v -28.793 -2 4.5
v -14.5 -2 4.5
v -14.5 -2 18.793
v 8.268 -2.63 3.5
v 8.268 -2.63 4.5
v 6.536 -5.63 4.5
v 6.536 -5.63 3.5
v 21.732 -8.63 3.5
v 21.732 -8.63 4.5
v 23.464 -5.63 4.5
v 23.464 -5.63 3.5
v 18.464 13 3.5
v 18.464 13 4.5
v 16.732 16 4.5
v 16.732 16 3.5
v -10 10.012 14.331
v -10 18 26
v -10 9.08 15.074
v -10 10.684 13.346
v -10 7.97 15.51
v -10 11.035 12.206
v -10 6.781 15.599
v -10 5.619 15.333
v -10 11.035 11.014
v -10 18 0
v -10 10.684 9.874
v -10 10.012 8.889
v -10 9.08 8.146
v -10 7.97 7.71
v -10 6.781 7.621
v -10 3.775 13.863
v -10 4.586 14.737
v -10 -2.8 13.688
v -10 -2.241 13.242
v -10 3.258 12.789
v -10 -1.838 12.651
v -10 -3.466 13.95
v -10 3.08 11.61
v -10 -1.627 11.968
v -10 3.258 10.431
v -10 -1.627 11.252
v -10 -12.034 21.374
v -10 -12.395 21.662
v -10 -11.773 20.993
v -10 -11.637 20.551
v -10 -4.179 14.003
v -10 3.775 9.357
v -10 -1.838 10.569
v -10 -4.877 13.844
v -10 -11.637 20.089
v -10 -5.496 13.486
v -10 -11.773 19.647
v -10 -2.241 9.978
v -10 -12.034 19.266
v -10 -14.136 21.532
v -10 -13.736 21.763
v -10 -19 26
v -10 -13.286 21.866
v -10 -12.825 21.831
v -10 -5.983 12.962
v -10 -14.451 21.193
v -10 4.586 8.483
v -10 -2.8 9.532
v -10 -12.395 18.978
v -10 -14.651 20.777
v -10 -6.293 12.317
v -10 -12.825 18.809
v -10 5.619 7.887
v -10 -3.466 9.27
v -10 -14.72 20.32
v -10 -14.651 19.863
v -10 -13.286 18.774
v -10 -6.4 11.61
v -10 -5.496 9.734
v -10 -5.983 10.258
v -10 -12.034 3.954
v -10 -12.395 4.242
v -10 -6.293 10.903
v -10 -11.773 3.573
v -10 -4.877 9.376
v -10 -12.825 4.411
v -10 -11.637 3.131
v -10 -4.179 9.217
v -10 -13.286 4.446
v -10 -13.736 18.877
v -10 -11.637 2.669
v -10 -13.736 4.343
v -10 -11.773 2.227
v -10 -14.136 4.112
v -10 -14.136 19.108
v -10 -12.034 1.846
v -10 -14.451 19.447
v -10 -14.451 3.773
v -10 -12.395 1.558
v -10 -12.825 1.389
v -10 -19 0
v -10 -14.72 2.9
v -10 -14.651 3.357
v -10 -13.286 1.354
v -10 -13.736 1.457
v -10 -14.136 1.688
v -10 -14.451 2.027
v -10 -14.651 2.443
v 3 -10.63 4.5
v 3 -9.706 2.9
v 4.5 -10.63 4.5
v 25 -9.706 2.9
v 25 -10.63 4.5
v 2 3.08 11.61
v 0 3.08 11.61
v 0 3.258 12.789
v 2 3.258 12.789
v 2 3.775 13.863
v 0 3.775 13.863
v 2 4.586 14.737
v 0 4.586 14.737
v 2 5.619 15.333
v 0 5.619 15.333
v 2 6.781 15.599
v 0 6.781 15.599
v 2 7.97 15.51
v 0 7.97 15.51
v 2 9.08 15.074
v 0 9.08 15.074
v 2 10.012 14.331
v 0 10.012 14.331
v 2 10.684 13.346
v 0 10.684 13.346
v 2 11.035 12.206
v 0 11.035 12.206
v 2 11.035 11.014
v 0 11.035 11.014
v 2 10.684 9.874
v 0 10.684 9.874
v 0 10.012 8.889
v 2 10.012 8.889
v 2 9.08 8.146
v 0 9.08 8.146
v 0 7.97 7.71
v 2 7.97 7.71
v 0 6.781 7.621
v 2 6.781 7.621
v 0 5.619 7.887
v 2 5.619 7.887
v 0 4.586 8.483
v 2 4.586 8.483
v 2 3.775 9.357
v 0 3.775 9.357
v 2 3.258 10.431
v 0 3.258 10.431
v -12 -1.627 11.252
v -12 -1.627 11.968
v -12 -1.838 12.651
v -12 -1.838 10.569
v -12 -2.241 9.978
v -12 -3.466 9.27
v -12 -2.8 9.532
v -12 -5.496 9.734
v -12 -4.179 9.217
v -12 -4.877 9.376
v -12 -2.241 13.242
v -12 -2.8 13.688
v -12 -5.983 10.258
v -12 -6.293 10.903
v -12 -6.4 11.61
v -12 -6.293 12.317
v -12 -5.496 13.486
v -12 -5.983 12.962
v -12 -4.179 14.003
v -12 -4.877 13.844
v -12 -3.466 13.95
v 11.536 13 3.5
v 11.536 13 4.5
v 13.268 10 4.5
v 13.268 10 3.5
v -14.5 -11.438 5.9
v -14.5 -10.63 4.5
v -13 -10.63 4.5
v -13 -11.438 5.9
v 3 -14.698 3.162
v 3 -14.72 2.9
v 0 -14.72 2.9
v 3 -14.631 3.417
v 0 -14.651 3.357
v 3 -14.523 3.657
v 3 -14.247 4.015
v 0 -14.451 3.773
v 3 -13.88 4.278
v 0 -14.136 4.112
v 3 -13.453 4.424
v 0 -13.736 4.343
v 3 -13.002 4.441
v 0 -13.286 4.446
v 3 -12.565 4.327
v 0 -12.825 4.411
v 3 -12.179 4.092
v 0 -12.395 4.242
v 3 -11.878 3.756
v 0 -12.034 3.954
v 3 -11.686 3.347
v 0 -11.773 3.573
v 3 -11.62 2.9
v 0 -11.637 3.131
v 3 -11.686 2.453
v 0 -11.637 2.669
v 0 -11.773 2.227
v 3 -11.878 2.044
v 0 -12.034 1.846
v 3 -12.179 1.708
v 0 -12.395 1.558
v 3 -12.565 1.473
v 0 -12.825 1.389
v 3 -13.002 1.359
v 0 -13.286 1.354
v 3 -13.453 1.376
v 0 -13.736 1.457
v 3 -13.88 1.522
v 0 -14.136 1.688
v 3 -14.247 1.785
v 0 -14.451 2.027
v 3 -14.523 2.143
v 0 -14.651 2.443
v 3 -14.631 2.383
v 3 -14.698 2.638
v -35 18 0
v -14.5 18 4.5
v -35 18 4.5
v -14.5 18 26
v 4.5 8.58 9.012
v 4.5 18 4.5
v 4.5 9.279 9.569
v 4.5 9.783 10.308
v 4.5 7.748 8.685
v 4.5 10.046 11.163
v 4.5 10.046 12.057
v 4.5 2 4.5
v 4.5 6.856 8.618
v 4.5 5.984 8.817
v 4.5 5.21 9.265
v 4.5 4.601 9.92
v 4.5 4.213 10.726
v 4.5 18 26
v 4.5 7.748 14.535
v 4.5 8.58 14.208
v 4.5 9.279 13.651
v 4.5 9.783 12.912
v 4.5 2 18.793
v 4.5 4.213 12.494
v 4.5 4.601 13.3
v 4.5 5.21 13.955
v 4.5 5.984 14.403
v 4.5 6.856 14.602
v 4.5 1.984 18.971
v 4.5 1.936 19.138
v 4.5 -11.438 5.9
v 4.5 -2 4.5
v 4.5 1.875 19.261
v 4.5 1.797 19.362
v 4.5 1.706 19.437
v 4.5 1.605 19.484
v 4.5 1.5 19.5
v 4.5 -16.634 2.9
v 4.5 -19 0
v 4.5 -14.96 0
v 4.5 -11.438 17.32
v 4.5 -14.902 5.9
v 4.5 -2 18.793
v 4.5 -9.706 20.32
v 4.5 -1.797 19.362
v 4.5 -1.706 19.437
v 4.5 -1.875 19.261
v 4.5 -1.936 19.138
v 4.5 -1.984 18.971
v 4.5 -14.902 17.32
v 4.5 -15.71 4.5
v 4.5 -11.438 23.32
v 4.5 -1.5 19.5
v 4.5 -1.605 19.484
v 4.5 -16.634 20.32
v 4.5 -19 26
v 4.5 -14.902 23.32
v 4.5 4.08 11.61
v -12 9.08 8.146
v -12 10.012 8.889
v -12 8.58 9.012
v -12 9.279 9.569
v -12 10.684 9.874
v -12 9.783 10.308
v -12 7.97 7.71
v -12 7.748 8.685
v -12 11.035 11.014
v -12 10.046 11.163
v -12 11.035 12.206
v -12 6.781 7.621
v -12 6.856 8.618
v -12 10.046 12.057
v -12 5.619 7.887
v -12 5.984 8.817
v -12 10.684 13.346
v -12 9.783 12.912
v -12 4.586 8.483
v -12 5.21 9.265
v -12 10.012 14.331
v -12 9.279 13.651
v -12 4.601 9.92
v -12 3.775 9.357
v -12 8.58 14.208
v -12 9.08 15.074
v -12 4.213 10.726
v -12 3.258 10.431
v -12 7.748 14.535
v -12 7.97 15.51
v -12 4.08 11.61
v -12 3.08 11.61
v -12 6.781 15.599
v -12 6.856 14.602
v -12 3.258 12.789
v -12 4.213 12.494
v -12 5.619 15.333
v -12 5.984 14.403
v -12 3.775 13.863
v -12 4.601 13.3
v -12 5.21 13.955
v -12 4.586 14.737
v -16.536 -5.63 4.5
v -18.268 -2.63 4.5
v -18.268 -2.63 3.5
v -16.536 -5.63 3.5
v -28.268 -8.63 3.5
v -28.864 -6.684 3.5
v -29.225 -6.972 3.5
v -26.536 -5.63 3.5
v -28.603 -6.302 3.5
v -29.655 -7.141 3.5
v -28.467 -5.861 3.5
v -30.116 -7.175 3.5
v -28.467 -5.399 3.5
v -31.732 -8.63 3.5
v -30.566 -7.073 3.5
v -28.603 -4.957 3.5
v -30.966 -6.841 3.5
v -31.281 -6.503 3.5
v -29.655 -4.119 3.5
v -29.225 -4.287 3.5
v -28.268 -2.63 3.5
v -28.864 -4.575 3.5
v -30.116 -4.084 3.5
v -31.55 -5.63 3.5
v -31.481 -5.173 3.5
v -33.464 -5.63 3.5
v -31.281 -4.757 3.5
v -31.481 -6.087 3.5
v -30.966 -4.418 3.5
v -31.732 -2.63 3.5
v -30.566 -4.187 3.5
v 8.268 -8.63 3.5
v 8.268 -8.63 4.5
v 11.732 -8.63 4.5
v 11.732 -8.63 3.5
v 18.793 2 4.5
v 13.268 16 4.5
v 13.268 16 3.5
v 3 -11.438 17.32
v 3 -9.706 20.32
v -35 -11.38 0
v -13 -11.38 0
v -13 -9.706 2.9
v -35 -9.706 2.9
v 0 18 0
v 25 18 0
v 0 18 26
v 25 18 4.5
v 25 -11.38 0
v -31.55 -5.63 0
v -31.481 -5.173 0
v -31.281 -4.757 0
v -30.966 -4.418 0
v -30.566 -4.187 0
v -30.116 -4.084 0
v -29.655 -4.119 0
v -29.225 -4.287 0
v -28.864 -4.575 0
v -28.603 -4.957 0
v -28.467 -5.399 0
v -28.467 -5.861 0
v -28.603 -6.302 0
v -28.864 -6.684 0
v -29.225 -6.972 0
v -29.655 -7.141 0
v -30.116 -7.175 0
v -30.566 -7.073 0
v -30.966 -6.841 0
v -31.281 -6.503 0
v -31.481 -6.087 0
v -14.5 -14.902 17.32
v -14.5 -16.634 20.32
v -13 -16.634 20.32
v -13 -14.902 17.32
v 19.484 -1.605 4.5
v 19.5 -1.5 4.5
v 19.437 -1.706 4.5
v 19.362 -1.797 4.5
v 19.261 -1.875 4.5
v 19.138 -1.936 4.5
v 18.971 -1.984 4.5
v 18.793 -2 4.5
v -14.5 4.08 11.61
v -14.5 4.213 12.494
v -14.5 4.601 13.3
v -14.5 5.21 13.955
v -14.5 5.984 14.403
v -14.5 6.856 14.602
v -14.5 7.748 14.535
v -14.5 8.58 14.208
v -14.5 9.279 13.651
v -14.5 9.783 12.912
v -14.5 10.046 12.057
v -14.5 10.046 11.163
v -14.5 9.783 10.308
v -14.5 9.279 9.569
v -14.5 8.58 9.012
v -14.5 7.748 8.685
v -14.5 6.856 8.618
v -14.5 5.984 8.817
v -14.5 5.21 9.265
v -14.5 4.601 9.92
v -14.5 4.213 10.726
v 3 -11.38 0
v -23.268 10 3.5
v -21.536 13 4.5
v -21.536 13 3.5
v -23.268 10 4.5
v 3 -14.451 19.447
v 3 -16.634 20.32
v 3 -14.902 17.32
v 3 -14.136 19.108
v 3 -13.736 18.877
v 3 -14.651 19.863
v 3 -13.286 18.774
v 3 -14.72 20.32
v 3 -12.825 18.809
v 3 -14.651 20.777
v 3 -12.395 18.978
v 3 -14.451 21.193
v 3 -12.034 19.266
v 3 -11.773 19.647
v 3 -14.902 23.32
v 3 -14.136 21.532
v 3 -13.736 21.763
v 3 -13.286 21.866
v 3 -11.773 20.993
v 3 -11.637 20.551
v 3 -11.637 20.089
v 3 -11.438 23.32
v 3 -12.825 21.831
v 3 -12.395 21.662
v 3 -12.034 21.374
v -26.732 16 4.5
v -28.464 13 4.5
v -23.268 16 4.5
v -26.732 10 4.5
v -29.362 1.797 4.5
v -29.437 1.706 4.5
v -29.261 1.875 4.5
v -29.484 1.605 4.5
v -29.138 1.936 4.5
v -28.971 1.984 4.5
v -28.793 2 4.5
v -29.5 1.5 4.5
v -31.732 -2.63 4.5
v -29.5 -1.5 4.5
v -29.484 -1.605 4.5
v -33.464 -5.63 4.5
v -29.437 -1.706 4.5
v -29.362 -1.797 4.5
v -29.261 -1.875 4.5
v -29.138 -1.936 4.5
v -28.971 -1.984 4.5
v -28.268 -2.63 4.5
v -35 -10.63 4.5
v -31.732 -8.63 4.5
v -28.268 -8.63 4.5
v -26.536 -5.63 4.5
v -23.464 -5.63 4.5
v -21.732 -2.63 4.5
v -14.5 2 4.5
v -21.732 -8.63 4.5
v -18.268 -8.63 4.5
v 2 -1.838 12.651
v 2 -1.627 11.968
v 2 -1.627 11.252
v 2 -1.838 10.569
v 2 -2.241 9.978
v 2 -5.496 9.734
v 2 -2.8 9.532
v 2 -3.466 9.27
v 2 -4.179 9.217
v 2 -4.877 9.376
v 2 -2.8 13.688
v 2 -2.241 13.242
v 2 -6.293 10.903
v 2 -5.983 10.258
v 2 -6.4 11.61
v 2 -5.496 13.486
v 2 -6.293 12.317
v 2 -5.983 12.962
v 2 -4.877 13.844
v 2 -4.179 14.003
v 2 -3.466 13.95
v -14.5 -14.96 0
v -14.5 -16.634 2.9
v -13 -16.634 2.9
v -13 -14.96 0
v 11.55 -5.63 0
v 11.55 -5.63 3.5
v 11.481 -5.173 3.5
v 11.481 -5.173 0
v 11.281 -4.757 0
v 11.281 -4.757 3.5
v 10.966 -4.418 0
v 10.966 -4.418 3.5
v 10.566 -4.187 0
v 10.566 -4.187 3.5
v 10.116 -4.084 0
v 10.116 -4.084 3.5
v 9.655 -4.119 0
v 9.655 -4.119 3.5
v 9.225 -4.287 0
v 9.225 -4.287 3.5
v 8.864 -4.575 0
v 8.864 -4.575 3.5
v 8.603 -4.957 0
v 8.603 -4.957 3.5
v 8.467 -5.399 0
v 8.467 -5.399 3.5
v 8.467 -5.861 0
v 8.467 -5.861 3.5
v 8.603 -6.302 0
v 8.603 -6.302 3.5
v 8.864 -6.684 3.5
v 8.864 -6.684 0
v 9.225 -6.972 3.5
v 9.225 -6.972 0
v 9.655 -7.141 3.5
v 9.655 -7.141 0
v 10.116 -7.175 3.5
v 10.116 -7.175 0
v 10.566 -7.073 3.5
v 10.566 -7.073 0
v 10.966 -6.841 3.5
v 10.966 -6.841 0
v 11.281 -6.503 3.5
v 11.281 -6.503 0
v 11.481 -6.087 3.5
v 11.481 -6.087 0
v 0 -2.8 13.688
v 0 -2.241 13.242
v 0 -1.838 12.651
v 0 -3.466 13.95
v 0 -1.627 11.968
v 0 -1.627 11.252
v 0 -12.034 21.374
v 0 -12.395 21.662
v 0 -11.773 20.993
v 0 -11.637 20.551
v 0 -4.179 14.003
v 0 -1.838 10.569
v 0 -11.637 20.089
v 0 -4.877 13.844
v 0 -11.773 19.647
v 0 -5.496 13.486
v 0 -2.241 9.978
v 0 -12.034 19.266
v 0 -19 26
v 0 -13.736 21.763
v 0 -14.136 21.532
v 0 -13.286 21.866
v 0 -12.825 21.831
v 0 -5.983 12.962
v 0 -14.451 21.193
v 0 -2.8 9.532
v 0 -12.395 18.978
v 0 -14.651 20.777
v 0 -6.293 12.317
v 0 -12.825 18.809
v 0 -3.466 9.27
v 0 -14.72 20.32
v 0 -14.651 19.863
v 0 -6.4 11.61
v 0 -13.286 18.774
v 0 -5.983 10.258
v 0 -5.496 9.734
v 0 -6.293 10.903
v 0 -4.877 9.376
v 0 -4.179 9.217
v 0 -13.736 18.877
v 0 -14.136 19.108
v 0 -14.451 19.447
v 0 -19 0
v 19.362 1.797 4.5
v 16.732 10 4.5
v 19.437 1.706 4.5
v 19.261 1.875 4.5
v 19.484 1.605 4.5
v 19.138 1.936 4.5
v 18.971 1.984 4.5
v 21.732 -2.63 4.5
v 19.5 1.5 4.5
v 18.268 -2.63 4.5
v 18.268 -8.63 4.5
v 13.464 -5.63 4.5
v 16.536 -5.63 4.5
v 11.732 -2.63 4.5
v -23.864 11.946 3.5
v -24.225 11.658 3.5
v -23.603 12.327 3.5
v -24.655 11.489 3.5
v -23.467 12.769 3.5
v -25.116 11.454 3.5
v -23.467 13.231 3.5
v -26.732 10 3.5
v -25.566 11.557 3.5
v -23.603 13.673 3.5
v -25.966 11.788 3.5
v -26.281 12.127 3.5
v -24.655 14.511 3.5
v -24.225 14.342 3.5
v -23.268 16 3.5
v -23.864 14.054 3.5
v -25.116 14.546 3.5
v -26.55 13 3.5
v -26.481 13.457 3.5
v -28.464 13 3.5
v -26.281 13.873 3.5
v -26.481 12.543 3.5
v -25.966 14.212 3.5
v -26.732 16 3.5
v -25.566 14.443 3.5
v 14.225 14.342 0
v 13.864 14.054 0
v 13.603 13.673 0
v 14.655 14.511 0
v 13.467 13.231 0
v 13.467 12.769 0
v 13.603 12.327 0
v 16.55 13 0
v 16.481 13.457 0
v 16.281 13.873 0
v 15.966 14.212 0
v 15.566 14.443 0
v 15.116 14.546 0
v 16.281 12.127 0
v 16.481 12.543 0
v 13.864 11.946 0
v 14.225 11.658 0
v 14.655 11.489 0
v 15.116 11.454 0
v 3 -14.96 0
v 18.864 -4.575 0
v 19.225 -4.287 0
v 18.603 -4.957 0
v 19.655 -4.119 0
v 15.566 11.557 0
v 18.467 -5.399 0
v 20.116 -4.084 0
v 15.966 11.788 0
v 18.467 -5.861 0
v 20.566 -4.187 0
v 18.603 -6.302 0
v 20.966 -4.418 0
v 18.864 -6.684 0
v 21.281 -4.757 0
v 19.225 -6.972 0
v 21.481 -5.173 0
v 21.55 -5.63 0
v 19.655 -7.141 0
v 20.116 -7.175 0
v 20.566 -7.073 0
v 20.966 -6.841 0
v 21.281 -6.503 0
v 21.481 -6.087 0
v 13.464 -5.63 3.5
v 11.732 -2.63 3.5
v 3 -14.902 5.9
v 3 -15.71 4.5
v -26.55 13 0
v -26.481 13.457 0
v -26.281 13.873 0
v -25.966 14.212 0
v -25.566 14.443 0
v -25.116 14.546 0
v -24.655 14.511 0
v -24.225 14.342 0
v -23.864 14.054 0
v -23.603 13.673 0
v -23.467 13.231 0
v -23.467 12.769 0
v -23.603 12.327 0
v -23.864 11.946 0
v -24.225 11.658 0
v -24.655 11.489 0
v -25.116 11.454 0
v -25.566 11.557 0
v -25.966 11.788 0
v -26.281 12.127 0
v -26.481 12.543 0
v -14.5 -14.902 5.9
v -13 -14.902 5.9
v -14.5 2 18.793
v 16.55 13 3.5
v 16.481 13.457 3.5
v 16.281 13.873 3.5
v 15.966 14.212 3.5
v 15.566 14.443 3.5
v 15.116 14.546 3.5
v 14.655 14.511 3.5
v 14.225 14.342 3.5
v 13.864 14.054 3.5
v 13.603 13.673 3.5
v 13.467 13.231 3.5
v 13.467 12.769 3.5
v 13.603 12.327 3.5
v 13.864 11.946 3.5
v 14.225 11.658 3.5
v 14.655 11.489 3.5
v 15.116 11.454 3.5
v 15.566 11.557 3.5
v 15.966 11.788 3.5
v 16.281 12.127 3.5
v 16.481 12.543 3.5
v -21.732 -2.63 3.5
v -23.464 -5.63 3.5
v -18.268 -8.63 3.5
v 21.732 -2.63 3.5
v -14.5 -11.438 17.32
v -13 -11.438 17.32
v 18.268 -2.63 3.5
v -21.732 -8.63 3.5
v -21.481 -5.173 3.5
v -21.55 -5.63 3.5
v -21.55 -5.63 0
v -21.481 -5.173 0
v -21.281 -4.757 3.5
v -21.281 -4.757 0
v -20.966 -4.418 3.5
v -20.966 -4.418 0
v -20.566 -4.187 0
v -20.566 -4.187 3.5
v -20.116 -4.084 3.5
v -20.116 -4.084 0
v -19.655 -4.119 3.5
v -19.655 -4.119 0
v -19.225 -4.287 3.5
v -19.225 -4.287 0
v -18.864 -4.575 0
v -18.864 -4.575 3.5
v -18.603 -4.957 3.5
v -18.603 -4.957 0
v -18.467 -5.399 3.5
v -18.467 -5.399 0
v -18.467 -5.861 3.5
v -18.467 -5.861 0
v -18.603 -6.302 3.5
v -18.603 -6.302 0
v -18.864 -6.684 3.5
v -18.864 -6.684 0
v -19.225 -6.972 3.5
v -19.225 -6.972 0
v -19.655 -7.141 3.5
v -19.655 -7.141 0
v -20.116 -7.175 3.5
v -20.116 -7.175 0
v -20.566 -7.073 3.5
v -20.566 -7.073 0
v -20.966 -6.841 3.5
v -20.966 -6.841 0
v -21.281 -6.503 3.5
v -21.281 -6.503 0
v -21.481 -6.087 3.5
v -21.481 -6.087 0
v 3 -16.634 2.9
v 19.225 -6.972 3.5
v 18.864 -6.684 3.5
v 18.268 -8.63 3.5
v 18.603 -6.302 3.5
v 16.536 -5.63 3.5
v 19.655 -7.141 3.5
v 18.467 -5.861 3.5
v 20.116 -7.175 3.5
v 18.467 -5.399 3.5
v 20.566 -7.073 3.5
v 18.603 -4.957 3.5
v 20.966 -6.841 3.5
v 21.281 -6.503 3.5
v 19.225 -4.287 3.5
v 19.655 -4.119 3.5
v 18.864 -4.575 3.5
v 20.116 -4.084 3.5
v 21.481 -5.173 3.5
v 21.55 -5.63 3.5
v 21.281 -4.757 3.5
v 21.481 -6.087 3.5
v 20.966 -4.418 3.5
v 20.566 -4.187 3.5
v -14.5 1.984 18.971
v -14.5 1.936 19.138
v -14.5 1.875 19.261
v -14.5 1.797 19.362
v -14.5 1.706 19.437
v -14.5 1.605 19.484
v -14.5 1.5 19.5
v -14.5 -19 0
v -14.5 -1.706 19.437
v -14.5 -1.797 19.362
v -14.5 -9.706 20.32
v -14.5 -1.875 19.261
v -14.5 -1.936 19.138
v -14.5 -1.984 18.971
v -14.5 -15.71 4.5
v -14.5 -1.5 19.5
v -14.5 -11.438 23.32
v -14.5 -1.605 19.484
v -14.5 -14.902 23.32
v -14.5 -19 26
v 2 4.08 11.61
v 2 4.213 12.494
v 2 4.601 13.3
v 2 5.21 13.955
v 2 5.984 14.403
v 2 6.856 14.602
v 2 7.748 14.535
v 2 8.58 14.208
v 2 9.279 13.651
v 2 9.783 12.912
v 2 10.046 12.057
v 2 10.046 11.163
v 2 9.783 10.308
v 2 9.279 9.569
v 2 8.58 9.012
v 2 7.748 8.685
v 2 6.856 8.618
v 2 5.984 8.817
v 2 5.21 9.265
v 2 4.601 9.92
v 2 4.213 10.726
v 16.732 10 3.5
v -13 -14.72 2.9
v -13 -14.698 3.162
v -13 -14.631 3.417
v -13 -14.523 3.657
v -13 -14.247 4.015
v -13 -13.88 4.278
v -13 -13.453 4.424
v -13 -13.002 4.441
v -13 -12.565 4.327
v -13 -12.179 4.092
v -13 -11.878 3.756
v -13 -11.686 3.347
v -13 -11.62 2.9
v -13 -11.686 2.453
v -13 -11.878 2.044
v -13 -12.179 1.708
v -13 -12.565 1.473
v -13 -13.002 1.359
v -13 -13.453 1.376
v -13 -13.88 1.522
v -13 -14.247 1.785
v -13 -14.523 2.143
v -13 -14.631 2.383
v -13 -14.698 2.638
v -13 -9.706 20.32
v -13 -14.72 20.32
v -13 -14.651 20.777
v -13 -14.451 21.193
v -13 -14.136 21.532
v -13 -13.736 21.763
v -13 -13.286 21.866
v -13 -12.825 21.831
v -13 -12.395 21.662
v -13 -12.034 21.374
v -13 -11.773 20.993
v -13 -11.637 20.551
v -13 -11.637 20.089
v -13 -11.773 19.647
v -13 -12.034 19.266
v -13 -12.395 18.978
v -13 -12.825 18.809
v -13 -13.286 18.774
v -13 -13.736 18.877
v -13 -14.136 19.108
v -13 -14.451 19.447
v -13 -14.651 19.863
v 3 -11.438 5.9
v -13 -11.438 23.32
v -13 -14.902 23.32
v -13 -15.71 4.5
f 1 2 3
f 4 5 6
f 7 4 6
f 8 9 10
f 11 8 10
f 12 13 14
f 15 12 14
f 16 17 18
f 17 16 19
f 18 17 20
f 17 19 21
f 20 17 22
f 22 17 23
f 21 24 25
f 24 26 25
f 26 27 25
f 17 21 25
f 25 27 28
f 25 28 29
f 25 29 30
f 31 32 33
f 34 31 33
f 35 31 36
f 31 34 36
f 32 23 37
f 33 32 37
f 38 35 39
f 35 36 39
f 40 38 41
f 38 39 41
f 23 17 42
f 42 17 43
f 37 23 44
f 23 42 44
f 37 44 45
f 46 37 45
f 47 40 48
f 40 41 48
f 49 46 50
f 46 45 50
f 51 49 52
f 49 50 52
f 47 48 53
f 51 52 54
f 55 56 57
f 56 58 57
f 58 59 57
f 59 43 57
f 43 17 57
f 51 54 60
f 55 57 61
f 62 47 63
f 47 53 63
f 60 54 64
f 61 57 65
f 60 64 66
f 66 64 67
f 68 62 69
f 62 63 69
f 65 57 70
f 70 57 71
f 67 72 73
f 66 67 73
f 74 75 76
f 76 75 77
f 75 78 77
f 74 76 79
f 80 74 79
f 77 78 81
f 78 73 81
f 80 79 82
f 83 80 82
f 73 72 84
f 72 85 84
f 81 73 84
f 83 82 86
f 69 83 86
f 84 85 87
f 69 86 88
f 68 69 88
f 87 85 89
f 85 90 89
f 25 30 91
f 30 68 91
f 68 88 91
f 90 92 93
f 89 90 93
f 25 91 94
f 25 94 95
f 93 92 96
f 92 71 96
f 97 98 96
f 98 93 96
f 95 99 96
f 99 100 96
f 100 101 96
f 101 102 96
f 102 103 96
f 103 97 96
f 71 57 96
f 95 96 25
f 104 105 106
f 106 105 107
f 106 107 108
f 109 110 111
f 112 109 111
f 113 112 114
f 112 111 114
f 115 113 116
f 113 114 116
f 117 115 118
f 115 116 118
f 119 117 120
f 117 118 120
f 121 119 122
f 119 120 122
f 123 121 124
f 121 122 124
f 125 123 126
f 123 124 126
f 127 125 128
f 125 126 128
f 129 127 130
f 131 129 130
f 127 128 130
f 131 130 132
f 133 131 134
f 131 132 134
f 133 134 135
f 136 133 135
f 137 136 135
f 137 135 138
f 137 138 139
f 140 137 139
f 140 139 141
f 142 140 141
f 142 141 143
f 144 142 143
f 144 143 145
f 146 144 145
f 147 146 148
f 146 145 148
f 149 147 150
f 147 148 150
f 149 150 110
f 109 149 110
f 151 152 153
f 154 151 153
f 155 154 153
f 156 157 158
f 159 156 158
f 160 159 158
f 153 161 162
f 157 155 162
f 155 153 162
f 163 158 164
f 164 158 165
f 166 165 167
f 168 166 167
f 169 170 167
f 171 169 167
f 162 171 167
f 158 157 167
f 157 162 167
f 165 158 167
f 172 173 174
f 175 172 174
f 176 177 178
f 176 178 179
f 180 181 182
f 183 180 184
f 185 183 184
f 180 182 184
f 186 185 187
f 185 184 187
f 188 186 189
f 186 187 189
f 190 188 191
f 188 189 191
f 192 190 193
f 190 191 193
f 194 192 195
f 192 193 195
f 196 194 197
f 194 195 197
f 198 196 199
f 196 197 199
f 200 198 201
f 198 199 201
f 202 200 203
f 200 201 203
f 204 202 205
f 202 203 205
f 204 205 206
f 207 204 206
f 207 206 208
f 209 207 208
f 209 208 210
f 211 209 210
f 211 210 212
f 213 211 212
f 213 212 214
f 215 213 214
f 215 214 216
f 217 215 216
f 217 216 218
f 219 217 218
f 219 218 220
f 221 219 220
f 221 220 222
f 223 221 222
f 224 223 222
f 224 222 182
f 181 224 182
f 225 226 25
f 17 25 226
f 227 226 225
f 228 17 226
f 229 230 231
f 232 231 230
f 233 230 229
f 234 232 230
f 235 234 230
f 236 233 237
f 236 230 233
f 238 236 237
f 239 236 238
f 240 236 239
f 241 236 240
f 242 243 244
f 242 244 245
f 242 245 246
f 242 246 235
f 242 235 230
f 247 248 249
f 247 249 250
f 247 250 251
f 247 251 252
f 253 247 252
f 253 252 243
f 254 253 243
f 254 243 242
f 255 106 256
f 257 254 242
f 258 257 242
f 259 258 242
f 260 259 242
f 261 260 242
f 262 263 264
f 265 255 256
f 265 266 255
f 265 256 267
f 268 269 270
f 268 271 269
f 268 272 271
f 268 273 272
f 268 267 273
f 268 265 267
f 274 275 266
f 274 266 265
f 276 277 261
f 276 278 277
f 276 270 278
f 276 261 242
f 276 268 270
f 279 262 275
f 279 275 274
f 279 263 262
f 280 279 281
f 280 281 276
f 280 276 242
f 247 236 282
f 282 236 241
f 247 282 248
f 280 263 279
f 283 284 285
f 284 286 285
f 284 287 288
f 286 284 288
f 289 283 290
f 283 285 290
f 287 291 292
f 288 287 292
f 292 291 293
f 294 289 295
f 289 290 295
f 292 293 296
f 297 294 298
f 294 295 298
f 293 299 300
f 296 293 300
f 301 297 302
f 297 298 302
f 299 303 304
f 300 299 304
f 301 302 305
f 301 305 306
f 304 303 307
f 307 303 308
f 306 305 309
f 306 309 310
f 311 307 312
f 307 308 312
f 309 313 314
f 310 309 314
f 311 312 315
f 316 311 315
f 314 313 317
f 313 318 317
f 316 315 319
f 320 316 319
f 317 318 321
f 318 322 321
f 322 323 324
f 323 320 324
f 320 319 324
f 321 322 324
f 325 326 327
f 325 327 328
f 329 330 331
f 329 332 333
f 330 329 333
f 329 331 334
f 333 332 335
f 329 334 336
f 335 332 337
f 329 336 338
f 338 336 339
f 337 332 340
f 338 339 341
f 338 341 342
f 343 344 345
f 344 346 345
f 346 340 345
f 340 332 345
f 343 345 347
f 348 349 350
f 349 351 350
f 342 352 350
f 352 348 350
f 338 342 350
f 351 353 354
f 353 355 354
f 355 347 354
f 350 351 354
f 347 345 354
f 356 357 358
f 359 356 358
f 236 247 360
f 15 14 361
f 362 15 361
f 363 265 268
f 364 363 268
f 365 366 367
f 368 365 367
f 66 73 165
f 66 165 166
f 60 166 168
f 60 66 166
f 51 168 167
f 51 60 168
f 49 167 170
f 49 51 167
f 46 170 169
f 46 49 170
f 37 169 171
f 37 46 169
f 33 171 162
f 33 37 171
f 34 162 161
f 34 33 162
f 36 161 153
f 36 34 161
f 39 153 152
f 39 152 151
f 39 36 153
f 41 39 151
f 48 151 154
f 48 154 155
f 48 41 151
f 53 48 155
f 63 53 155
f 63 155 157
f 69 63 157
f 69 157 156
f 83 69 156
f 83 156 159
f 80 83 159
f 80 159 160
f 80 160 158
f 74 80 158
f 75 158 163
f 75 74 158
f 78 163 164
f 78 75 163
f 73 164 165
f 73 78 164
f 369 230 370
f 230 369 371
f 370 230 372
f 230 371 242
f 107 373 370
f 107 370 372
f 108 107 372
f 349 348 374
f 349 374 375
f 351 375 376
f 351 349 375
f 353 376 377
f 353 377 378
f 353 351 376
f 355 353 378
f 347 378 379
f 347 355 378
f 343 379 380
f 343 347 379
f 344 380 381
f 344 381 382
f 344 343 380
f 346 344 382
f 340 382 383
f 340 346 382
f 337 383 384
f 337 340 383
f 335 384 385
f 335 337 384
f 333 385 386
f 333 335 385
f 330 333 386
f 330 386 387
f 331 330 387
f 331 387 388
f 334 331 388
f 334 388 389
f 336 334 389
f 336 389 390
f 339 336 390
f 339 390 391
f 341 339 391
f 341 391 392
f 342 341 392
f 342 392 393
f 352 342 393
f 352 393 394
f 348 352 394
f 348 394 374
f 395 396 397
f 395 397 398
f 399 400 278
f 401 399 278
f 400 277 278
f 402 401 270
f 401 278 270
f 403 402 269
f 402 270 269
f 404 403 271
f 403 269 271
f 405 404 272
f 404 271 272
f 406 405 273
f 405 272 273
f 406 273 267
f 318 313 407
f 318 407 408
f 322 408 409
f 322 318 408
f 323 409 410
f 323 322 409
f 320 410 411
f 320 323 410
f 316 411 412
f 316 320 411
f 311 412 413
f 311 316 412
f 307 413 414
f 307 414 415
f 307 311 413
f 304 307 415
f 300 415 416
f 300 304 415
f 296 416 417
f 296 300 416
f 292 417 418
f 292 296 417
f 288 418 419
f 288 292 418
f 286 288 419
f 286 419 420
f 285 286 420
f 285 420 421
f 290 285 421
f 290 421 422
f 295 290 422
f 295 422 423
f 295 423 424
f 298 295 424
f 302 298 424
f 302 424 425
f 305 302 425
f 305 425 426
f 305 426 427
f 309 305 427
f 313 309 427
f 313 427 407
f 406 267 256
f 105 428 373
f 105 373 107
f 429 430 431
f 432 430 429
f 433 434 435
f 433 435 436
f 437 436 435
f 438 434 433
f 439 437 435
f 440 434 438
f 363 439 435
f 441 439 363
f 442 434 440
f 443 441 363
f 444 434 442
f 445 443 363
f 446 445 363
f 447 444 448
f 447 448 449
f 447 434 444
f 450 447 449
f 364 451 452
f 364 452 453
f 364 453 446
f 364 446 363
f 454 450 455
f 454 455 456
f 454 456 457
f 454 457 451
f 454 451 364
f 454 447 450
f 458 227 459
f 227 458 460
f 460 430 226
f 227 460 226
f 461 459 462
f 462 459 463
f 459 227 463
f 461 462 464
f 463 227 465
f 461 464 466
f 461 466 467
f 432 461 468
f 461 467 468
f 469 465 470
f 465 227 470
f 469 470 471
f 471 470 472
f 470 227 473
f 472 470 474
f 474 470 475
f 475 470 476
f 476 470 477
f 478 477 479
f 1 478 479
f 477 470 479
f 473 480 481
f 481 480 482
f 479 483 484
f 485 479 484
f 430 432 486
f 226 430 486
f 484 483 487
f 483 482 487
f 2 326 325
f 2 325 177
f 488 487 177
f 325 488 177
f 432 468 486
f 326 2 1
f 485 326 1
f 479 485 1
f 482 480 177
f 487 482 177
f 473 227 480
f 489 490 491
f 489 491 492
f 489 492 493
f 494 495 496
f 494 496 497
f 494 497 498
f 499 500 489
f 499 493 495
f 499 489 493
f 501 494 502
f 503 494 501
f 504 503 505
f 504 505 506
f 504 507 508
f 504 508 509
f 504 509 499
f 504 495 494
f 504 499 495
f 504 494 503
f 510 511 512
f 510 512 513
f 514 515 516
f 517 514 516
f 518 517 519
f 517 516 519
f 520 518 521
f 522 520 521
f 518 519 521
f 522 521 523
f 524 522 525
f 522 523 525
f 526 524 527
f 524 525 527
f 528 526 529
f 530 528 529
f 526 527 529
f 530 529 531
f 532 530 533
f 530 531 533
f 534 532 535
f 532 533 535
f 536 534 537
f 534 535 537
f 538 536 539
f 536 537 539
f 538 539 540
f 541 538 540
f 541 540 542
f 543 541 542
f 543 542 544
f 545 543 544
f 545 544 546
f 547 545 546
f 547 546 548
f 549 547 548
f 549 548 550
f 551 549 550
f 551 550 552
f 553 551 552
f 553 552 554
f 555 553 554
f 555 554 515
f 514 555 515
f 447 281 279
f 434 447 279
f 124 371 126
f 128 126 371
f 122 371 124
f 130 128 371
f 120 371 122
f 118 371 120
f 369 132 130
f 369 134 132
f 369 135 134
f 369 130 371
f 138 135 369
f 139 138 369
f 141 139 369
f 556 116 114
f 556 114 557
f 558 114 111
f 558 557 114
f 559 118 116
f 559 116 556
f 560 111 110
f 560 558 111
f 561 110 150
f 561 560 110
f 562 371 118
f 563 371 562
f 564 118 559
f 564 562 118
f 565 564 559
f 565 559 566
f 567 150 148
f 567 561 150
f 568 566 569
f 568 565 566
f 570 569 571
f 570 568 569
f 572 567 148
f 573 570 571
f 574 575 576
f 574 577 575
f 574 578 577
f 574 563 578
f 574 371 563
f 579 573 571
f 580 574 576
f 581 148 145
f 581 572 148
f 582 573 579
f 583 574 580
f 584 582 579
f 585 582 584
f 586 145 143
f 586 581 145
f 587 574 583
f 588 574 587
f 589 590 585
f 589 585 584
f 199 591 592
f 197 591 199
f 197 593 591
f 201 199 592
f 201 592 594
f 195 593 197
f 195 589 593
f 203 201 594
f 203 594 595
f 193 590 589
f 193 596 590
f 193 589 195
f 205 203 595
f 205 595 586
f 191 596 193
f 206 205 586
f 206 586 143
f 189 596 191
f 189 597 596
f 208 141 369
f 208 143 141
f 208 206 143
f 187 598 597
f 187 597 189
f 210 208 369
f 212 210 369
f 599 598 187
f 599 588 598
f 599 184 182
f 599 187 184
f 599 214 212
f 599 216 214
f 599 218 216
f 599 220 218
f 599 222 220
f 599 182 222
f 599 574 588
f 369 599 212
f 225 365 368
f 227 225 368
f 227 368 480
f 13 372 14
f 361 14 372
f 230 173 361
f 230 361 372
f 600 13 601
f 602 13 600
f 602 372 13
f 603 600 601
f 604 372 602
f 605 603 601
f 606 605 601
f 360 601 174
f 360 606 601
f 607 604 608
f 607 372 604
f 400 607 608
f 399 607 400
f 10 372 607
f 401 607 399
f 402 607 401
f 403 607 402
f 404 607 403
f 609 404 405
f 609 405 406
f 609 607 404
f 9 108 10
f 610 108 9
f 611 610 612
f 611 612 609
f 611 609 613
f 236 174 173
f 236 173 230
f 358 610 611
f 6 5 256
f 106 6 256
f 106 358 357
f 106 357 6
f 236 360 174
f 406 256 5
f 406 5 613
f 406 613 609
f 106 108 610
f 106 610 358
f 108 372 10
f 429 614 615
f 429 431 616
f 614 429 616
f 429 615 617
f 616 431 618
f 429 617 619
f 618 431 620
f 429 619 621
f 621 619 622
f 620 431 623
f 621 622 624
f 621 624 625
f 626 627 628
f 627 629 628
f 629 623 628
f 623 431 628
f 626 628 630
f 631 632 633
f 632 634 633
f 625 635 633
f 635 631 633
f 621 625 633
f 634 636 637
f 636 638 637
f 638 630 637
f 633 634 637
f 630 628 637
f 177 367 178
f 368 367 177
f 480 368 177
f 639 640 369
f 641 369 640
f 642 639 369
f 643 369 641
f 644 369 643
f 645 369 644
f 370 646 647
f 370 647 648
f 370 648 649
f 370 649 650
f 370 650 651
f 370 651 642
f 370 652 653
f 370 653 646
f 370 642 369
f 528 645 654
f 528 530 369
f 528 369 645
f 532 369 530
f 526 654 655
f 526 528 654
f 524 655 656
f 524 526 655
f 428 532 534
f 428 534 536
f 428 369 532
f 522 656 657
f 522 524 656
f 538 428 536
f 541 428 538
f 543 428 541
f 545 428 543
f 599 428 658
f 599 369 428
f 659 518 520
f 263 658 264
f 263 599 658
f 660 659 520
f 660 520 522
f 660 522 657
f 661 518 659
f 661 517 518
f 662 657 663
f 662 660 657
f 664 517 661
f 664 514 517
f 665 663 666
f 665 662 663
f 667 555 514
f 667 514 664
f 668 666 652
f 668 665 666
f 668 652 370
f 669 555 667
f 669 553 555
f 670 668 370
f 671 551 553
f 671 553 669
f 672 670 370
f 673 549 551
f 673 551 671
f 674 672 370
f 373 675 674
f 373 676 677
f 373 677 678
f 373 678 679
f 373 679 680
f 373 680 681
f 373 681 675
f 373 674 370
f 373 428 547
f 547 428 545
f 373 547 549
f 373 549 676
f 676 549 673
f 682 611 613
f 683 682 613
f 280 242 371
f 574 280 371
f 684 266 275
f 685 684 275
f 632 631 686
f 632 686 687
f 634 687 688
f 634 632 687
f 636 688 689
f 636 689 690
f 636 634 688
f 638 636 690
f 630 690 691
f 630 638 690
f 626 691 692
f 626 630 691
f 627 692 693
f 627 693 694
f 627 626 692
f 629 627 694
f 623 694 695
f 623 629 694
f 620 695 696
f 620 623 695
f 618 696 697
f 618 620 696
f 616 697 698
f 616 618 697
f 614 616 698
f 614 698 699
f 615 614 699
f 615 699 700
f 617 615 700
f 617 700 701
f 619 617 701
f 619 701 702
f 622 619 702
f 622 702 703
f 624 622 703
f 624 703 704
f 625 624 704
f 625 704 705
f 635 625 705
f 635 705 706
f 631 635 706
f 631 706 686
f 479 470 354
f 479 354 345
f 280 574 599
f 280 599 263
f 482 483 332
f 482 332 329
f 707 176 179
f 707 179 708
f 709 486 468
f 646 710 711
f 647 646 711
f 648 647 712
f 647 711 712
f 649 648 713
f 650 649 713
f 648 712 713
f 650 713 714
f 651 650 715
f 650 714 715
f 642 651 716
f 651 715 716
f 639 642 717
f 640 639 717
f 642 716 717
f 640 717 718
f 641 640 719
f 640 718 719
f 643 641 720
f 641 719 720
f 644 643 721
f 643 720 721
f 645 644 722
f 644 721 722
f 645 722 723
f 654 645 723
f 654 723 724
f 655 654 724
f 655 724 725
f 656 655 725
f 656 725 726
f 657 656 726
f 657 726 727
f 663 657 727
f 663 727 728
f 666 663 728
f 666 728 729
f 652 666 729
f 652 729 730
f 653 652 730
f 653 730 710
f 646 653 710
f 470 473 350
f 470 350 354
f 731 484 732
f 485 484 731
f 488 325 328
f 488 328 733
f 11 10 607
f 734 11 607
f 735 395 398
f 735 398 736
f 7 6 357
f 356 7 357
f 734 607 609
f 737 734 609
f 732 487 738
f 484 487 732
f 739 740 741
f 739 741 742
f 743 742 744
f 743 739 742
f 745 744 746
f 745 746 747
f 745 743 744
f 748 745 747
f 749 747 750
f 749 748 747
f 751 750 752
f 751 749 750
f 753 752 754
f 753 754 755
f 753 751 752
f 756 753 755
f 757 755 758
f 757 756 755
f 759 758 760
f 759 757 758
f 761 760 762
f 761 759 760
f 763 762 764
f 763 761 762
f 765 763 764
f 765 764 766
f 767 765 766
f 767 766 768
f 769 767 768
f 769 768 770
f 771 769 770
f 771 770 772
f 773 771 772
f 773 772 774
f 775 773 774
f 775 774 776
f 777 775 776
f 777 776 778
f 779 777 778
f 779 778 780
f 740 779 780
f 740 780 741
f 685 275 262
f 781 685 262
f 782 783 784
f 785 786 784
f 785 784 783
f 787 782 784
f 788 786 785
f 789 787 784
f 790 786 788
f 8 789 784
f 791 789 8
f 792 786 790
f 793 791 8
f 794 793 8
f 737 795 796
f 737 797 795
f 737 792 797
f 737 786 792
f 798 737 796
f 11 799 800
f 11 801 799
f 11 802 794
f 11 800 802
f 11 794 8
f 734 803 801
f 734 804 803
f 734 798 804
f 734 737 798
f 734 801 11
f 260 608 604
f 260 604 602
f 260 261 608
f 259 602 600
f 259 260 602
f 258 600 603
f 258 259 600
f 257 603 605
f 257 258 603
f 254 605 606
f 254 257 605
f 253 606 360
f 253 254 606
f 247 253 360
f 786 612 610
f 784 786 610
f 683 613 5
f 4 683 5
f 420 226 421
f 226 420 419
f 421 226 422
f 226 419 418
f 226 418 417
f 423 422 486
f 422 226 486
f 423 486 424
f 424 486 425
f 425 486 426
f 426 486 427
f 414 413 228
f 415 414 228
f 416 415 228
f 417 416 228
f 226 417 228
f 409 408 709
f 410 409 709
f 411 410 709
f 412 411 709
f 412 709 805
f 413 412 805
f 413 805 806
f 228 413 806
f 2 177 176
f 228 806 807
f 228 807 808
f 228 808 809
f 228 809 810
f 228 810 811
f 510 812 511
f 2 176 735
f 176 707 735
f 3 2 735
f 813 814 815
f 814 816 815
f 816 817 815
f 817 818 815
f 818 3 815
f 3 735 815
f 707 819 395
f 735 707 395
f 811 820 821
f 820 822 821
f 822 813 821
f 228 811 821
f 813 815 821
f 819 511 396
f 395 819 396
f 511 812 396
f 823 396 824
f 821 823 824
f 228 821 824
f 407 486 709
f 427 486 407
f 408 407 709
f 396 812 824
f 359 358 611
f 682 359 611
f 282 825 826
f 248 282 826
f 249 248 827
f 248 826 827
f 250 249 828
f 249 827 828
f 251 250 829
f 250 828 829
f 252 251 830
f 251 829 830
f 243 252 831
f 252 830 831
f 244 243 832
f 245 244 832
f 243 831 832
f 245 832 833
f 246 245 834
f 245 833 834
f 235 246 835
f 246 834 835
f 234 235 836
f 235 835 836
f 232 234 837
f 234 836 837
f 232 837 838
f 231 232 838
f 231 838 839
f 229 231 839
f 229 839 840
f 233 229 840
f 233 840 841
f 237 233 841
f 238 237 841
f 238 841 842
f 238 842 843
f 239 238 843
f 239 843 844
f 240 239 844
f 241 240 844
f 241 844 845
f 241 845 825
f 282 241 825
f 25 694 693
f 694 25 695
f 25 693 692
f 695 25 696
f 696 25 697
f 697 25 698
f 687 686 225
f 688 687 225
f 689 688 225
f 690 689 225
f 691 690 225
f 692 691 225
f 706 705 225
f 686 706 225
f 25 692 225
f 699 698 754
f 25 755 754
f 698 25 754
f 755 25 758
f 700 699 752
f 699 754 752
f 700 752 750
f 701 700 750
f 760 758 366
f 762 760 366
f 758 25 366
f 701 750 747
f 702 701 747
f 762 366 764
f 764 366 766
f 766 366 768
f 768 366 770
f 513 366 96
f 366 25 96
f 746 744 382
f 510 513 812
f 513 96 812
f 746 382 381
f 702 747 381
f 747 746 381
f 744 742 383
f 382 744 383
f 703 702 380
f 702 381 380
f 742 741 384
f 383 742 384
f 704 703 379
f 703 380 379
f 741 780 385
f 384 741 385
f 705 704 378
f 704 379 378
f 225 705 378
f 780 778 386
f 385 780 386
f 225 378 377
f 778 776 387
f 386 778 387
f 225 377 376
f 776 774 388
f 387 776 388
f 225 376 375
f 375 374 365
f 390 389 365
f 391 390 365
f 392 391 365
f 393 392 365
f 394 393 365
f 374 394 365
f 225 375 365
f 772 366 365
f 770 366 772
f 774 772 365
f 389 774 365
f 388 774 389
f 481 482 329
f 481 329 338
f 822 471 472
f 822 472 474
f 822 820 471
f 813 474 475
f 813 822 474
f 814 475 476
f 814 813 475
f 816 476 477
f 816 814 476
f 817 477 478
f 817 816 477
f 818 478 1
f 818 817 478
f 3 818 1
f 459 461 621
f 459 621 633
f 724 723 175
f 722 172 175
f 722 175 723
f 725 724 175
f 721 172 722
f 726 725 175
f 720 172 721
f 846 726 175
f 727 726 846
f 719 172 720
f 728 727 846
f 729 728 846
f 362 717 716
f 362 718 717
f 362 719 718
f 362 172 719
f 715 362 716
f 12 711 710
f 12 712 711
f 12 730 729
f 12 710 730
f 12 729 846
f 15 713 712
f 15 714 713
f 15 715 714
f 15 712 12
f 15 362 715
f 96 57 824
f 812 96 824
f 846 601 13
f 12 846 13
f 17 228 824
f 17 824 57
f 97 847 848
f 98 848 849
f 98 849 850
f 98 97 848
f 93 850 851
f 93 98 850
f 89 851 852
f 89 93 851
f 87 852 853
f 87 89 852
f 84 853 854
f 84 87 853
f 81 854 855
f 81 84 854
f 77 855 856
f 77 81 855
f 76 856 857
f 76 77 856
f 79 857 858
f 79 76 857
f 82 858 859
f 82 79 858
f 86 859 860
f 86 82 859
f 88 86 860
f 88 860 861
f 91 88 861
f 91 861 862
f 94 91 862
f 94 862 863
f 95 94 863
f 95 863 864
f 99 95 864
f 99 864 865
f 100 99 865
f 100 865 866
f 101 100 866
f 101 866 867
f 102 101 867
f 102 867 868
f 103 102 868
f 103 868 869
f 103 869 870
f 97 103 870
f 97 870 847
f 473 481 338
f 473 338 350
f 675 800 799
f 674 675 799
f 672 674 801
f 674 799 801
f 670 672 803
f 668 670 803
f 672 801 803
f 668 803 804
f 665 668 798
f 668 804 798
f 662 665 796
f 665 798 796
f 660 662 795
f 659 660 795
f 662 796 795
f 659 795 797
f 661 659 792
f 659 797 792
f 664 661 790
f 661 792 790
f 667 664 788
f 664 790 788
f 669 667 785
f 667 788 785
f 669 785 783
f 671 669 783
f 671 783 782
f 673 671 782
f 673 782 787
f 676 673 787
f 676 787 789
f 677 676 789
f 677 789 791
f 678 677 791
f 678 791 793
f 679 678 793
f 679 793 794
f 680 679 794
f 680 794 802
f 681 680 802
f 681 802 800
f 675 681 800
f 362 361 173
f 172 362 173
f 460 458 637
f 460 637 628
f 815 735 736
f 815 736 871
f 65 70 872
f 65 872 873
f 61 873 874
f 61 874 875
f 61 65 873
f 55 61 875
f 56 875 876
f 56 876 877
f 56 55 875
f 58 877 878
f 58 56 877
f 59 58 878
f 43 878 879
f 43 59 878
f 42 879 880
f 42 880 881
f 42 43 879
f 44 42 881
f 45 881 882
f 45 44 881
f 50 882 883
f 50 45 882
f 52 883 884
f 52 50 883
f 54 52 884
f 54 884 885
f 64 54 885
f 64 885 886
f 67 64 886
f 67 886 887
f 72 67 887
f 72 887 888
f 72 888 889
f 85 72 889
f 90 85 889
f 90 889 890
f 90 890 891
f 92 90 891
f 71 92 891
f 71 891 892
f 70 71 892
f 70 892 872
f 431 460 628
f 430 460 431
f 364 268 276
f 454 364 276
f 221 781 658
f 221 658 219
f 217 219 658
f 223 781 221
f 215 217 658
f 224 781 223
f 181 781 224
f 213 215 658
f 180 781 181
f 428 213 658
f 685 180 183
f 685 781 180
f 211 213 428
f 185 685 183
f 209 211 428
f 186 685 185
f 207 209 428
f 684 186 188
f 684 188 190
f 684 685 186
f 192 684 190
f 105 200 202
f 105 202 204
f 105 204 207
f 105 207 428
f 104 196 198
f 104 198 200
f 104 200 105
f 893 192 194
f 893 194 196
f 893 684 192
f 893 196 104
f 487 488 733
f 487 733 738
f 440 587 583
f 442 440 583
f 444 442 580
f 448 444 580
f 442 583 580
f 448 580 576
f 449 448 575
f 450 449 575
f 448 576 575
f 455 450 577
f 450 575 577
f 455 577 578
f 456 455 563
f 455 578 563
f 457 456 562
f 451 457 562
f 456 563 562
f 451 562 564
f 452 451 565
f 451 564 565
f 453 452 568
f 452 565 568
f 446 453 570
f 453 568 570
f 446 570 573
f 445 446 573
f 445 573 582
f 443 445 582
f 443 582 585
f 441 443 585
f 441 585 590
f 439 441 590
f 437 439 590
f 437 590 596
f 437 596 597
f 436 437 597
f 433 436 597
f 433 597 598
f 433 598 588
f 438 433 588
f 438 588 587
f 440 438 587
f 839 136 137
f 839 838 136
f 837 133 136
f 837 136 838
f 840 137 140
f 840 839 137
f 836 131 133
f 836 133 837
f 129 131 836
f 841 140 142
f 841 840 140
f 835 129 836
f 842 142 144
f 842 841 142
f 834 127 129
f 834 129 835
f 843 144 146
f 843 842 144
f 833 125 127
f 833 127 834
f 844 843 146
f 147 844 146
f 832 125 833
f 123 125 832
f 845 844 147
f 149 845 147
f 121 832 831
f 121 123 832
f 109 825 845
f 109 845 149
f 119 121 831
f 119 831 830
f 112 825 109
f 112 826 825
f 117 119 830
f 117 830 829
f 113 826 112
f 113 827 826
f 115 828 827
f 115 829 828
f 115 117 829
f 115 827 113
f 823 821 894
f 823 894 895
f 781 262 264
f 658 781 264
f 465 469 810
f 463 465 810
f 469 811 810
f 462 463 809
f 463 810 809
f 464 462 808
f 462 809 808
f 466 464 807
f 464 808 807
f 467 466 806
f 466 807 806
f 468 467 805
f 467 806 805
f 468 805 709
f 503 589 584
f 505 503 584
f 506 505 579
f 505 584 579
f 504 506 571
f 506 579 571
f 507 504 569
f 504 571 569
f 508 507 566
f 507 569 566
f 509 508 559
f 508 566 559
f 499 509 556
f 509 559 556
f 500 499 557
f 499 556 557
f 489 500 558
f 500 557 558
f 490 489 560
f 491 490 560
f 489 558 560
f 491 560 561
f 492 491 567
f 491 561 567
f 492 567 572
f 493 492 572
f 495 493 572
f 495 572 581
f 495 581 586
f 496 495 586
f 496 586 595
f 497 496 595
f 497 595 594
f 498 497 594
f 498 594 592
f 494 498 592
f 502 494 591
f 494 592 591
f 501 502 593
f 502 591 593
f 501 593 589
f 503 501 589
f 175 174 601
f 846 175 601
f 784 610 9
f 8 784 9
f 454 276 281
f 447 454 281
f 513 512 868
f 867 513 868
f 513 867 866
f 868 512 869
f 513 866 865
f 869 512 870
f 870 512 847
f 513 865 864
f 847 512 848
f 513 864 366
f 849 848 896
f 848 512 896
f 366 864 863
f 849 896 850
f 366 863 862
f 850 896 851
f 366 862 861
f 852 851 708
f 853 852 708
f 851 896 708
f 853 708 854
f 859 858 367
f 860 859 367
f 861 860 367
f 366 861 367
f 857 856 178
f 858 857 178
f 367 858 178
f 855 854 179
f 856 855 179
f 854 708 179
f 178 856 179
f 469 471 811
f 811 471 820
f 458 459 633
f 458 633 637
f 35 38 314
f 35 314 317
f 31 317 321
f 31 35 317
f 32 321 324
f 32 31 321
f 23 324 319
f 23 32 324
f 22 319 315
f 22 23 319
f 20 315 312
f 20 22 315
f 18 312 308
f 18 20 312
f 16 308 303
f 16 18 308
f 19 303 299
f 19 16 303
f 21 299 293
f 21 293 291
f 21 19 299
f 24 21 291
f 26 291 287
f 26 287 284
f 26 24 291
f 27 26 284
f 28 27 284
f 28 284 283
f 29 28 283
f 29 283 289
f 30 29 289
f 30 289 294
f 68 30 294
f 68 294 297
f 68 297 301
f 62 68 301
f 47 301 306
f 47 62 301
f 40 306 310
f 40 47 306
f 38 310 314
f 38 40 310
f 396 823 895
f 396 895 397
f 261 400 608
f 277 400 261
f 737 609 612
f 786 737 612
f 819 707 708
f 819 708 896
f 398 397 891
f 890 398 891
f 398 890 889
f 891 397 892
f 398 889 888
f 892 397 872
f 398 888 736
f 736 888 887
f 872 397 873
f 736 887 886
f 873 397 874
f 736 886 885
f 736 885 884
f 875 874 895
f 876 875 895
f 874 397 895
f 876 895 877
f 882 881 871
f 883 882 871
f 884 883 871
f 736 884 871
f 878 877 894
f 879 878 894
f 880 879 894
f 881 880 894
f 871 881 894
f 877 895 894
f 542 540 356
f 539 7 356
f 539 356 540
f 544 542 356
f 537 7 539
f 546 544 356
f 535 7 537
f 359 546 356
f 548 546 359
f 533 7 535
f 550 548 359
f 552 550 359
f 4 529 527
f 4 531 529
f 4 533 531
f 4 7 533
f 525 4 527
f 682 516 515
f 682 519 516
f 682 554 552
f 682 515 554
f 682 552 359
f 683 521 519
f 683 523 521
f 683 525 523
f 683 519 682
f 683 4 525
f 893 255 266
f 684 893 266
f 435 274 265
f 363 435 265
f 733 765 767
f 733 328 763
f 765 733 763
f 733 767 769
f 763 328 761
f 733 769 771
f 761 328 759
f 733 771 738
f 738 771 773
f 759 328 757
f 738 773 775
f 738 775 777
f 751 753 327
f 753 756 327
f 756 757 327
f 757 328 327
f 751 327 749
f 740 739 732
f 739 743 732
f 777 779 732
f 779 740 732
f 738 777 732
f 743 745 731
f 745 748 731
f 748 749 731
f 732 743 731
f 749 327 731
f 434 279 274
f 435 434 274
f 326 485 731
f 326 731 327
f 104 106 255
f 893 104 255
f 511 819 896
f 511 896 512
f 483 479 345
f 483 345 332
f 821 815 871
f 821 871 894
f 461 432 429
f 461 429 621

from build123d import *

# Parameters (mm, degrees)
F1_DEPTH      = 19
F1_DEPTH_BACK = 18
F2_DEPTH      = 2
F2_DEPTH_BACK = 2
F3_R          = 1.55
F4_DEPTH      = 26
F6_DEPTH      = 22
F7_DEPTH      = 20.5
F8_R          = 1.55
F9_DEPTH      = 1
F10_DEPTH     = 6
F11_R         = 0.5
F3_R_2        = 3
F12_DEPTH     = 6
F3_R_3        = 4
F3_R_4        = 2.4
F13_DEPTH     = 2


with BuildPart() as f1:
    # F0 (on Front) → F1 (new body, two sides)
    with BuildSketch(Plane.XZ) as f1_sk:
        Polygon((0, 26), (0, 0), (25, 0), (25, 4.5), (19.5, 4.5), (4.5, 4.5), (4.5, 19.5), (4.5, 26), align=None)
    extrude(amount=F1_DEPTH)
    extrude(f1_sk.sketch, amount=-F1_DEPTH_BACK)

    # F0 (on Front) → F2 (join, two sides)
    with BuildSketch(Plane.XZ) as f2_sk:
        Polygon((19.5, 4.5), (4.5, 19.5), (4.5, 4.5), align=None)
    extrude(amount=F2_DEPTH)
    extrude(f2_sk.sketch, amount=-F2_DEPTH_BACK)

    # F3 (on face) → F4 (cut)
    with BuildSketch(Plane(origin=(0, 0, 0), x_dir=(0, -1, 0), z_dir=(-1, 0, 0))):
        with Locations((13.17, 2.9)):
            Circle(F3_R)
        with Locations((13.17, 20.32)):
            Circle(F3_R)
    extrude(amount=-F4_DEPTH, mode=Mode.SUBTRACT)

    # F5 (on face) → F6 (cut)
    with BuildSketch(Plane.YZ.offset(25)):
        Polygon((-14.9020508076, 17.32), (-11.4379491924, 17.32), (-9.7058983849, 20.32), (-11.4379491924, 23.32), (-14.9020508076, 23.32), (-16.6341016151, 20.32), align=None)
        Polygon((-14.9020508076, -0.1), (-11.4379491924, -0.1), (-11.3802141655, 0), (-14.5227368921, 0), (-14.9597858345, 0), align=None)
        Polygon((-14.5227368921, 4.5), (-10.6296588156, 4.5), (-11.4379491924, 5.9), (-14.9020508076, 5.9), (-15.7103411844, 4.5), align=None)
        with BuildLine():
            Line((-16.6341016151, 2.9), (-14.9597858345, 0))
            Line((-14.9597858345, 0), (-14.5227368921, 0))
            Line((-14.5227368921, 0), (-14.5227368921, 2.1432947068))
            ThreePointArc((-14.5227368921, 2.1432947068), (-14.72, 2.9), (-14.5227368921, 3.6567052932))
            Line((-14.5227368921, 3.6567052932), (-14.5227368921, 4.5))
            Line((-14.5227368921, 4.5), (-15.7103411844, 4.5))
            Line((-15.7103411844, 4.5), (-16.6341016151, 2.9))
        make_face()
        with BuildLine():
            Line((-14.5227368921, 0), (-11.3802141655, 0))
            Line((-11.3802141655, 0), (-9.7058983849, 2.9))
            Line((-9.7058983849, 2.9), (-10.6296588156, 4.5))
            Line((-10.6296588156, 4.5), (-14.5227368921, 4.5))
            Line((-14.5227368921, 4.5), (-14.5227368921, 3.6567052932))
            ThreePointArc((-14.5227368921, 3.6567052932), (-12.7790026744, 4.3998736918), (-11.62, 2.9))
            ThreePointArc((-11.62, 2.9), (-12.7790026744, 1.4001263082), (-14.5227368921, 2.1432947068))
            Line((-14.5227368921, 2.1432947068), (-14.5227368921, 0))
        make_face()
    extrude(amount=-F6_DEPTH, mode=Mode.SUBTRACT)

    # F7 (cut): a face of the model
    f7_faces = [f1.faces().sort_by_distance(p)[0] for p in [
        (25, -17.4312907, 2.1162889805),
    ]]
    extrude(f7_faces, amount=-F7_DEPTH, mode=Mode.SUBTRACT)

    # F8 (on face) → F9 (cut)
    with BuildSketch(Plane.XY.offset(4.5)):
        Polygon((8.2679491924, -8.6296588156), (11.7320508076, -8.6296588156), (13.4641016151, -5.6296588156), (11.7320508076, -2.6296588156), (8.2679491924, -2.6296588156), (6.5358983849, -5.6296588156), align=None)
        with Locations((10, -5.6296588156)):
            Circle(F8_R, mode=Mode.SUBTRACT)
        Polygon((18.2679491924, -8.6296588156), (21.7320508076, -8.6296588156), (23.4641016151, -5.6296588156), (21.7320508076, -2.6296588156), (18.2679491924, -2.6296588156), (16.5358983849, -5.6296588156), align=None)
        with Locations((20, -5.6296588156)):
            Circle(F8_R, mode=Mode.SUBTRACT)
        Polygon((16.7320508076, 16), (13.2679491924, 16), (11.5358983849, 13), (13.2679491924, 10), (16.7320508076, 10), (18.4641016151, 13), align=None)
        with Locations((15, 13)):
            Circle(F8_R, mode=Mode.SUBTRACT)
        with Locations((10, -5.6296588156)):
            Circle(F8_R)
        with Locations((20, -5.6296588156)):
            Circle(F8_R)
        with Locations((15, 13)):
            Circle(F8_R)
    extrude(amount=-F9_DEPTH, mode=Mode.SUBTRACT)

    # F8 (on face) → F10 (cut)
    with BuildSketch(Plane.XY.offset(4.5)):
        with Locations((10, -5.6296588156)):
            Circle(F8_R)
        with Locations((20, -5.6296588156)):
            Circle(F8_R)
        with Locations((15, 13)):
            Circle(F8_R)
    extrude(amount=-F10_DEPTH, mode=Mode.SUBTRACT)

    # F11
    f11_edges = [f1.edges().sort_by_distance(p)[0] for p in [
        (12, -2, 12),
        (12, 2, 12),
    ]]
    fillet(f11_edges, radius=F11_R)

    # F3 (on face) → F12 (cut)
    with BuildSketch(Plane(origin=(0, 0, 0), x_dir=(0, -1, 0), z_dir=(-1, 0, 0))):
        with Locations((-7.08, 11.61)):
            Circle(F3_R_2)
    extrude(amount=-F12_DEPTH, mode=Mode.SUBTRACT)

    # F3 (on face) → F13 (cut)
    with BuildSketch(Plane(origin=(0, 0, 0), x_dir=(0, -1, 0), z_dir=(-1, 0, 0))):
        with Locations((-7.08, 11.61)):
            Circle(F3_R_3)
        with Locations((-7.08, 11.61)):
            Circle(F3_R_2, mode=Mode.SUBTRACT)
        with Locations((4, 11.61)):
            Circle(F3_R_4)
    extrude(amount=-F13_DEPTH, mode=Mode.SUBTRACT)


with BuildPart() as f15_1:
    # F15: instance of F1
    add(f1.part.mirror(Plane(origin=(-5, 0, 0), x_dir=(0, -1, 0), z_dir=(-1, 0, 0))))


solid = Compound([f1.part, f15_1.part])
